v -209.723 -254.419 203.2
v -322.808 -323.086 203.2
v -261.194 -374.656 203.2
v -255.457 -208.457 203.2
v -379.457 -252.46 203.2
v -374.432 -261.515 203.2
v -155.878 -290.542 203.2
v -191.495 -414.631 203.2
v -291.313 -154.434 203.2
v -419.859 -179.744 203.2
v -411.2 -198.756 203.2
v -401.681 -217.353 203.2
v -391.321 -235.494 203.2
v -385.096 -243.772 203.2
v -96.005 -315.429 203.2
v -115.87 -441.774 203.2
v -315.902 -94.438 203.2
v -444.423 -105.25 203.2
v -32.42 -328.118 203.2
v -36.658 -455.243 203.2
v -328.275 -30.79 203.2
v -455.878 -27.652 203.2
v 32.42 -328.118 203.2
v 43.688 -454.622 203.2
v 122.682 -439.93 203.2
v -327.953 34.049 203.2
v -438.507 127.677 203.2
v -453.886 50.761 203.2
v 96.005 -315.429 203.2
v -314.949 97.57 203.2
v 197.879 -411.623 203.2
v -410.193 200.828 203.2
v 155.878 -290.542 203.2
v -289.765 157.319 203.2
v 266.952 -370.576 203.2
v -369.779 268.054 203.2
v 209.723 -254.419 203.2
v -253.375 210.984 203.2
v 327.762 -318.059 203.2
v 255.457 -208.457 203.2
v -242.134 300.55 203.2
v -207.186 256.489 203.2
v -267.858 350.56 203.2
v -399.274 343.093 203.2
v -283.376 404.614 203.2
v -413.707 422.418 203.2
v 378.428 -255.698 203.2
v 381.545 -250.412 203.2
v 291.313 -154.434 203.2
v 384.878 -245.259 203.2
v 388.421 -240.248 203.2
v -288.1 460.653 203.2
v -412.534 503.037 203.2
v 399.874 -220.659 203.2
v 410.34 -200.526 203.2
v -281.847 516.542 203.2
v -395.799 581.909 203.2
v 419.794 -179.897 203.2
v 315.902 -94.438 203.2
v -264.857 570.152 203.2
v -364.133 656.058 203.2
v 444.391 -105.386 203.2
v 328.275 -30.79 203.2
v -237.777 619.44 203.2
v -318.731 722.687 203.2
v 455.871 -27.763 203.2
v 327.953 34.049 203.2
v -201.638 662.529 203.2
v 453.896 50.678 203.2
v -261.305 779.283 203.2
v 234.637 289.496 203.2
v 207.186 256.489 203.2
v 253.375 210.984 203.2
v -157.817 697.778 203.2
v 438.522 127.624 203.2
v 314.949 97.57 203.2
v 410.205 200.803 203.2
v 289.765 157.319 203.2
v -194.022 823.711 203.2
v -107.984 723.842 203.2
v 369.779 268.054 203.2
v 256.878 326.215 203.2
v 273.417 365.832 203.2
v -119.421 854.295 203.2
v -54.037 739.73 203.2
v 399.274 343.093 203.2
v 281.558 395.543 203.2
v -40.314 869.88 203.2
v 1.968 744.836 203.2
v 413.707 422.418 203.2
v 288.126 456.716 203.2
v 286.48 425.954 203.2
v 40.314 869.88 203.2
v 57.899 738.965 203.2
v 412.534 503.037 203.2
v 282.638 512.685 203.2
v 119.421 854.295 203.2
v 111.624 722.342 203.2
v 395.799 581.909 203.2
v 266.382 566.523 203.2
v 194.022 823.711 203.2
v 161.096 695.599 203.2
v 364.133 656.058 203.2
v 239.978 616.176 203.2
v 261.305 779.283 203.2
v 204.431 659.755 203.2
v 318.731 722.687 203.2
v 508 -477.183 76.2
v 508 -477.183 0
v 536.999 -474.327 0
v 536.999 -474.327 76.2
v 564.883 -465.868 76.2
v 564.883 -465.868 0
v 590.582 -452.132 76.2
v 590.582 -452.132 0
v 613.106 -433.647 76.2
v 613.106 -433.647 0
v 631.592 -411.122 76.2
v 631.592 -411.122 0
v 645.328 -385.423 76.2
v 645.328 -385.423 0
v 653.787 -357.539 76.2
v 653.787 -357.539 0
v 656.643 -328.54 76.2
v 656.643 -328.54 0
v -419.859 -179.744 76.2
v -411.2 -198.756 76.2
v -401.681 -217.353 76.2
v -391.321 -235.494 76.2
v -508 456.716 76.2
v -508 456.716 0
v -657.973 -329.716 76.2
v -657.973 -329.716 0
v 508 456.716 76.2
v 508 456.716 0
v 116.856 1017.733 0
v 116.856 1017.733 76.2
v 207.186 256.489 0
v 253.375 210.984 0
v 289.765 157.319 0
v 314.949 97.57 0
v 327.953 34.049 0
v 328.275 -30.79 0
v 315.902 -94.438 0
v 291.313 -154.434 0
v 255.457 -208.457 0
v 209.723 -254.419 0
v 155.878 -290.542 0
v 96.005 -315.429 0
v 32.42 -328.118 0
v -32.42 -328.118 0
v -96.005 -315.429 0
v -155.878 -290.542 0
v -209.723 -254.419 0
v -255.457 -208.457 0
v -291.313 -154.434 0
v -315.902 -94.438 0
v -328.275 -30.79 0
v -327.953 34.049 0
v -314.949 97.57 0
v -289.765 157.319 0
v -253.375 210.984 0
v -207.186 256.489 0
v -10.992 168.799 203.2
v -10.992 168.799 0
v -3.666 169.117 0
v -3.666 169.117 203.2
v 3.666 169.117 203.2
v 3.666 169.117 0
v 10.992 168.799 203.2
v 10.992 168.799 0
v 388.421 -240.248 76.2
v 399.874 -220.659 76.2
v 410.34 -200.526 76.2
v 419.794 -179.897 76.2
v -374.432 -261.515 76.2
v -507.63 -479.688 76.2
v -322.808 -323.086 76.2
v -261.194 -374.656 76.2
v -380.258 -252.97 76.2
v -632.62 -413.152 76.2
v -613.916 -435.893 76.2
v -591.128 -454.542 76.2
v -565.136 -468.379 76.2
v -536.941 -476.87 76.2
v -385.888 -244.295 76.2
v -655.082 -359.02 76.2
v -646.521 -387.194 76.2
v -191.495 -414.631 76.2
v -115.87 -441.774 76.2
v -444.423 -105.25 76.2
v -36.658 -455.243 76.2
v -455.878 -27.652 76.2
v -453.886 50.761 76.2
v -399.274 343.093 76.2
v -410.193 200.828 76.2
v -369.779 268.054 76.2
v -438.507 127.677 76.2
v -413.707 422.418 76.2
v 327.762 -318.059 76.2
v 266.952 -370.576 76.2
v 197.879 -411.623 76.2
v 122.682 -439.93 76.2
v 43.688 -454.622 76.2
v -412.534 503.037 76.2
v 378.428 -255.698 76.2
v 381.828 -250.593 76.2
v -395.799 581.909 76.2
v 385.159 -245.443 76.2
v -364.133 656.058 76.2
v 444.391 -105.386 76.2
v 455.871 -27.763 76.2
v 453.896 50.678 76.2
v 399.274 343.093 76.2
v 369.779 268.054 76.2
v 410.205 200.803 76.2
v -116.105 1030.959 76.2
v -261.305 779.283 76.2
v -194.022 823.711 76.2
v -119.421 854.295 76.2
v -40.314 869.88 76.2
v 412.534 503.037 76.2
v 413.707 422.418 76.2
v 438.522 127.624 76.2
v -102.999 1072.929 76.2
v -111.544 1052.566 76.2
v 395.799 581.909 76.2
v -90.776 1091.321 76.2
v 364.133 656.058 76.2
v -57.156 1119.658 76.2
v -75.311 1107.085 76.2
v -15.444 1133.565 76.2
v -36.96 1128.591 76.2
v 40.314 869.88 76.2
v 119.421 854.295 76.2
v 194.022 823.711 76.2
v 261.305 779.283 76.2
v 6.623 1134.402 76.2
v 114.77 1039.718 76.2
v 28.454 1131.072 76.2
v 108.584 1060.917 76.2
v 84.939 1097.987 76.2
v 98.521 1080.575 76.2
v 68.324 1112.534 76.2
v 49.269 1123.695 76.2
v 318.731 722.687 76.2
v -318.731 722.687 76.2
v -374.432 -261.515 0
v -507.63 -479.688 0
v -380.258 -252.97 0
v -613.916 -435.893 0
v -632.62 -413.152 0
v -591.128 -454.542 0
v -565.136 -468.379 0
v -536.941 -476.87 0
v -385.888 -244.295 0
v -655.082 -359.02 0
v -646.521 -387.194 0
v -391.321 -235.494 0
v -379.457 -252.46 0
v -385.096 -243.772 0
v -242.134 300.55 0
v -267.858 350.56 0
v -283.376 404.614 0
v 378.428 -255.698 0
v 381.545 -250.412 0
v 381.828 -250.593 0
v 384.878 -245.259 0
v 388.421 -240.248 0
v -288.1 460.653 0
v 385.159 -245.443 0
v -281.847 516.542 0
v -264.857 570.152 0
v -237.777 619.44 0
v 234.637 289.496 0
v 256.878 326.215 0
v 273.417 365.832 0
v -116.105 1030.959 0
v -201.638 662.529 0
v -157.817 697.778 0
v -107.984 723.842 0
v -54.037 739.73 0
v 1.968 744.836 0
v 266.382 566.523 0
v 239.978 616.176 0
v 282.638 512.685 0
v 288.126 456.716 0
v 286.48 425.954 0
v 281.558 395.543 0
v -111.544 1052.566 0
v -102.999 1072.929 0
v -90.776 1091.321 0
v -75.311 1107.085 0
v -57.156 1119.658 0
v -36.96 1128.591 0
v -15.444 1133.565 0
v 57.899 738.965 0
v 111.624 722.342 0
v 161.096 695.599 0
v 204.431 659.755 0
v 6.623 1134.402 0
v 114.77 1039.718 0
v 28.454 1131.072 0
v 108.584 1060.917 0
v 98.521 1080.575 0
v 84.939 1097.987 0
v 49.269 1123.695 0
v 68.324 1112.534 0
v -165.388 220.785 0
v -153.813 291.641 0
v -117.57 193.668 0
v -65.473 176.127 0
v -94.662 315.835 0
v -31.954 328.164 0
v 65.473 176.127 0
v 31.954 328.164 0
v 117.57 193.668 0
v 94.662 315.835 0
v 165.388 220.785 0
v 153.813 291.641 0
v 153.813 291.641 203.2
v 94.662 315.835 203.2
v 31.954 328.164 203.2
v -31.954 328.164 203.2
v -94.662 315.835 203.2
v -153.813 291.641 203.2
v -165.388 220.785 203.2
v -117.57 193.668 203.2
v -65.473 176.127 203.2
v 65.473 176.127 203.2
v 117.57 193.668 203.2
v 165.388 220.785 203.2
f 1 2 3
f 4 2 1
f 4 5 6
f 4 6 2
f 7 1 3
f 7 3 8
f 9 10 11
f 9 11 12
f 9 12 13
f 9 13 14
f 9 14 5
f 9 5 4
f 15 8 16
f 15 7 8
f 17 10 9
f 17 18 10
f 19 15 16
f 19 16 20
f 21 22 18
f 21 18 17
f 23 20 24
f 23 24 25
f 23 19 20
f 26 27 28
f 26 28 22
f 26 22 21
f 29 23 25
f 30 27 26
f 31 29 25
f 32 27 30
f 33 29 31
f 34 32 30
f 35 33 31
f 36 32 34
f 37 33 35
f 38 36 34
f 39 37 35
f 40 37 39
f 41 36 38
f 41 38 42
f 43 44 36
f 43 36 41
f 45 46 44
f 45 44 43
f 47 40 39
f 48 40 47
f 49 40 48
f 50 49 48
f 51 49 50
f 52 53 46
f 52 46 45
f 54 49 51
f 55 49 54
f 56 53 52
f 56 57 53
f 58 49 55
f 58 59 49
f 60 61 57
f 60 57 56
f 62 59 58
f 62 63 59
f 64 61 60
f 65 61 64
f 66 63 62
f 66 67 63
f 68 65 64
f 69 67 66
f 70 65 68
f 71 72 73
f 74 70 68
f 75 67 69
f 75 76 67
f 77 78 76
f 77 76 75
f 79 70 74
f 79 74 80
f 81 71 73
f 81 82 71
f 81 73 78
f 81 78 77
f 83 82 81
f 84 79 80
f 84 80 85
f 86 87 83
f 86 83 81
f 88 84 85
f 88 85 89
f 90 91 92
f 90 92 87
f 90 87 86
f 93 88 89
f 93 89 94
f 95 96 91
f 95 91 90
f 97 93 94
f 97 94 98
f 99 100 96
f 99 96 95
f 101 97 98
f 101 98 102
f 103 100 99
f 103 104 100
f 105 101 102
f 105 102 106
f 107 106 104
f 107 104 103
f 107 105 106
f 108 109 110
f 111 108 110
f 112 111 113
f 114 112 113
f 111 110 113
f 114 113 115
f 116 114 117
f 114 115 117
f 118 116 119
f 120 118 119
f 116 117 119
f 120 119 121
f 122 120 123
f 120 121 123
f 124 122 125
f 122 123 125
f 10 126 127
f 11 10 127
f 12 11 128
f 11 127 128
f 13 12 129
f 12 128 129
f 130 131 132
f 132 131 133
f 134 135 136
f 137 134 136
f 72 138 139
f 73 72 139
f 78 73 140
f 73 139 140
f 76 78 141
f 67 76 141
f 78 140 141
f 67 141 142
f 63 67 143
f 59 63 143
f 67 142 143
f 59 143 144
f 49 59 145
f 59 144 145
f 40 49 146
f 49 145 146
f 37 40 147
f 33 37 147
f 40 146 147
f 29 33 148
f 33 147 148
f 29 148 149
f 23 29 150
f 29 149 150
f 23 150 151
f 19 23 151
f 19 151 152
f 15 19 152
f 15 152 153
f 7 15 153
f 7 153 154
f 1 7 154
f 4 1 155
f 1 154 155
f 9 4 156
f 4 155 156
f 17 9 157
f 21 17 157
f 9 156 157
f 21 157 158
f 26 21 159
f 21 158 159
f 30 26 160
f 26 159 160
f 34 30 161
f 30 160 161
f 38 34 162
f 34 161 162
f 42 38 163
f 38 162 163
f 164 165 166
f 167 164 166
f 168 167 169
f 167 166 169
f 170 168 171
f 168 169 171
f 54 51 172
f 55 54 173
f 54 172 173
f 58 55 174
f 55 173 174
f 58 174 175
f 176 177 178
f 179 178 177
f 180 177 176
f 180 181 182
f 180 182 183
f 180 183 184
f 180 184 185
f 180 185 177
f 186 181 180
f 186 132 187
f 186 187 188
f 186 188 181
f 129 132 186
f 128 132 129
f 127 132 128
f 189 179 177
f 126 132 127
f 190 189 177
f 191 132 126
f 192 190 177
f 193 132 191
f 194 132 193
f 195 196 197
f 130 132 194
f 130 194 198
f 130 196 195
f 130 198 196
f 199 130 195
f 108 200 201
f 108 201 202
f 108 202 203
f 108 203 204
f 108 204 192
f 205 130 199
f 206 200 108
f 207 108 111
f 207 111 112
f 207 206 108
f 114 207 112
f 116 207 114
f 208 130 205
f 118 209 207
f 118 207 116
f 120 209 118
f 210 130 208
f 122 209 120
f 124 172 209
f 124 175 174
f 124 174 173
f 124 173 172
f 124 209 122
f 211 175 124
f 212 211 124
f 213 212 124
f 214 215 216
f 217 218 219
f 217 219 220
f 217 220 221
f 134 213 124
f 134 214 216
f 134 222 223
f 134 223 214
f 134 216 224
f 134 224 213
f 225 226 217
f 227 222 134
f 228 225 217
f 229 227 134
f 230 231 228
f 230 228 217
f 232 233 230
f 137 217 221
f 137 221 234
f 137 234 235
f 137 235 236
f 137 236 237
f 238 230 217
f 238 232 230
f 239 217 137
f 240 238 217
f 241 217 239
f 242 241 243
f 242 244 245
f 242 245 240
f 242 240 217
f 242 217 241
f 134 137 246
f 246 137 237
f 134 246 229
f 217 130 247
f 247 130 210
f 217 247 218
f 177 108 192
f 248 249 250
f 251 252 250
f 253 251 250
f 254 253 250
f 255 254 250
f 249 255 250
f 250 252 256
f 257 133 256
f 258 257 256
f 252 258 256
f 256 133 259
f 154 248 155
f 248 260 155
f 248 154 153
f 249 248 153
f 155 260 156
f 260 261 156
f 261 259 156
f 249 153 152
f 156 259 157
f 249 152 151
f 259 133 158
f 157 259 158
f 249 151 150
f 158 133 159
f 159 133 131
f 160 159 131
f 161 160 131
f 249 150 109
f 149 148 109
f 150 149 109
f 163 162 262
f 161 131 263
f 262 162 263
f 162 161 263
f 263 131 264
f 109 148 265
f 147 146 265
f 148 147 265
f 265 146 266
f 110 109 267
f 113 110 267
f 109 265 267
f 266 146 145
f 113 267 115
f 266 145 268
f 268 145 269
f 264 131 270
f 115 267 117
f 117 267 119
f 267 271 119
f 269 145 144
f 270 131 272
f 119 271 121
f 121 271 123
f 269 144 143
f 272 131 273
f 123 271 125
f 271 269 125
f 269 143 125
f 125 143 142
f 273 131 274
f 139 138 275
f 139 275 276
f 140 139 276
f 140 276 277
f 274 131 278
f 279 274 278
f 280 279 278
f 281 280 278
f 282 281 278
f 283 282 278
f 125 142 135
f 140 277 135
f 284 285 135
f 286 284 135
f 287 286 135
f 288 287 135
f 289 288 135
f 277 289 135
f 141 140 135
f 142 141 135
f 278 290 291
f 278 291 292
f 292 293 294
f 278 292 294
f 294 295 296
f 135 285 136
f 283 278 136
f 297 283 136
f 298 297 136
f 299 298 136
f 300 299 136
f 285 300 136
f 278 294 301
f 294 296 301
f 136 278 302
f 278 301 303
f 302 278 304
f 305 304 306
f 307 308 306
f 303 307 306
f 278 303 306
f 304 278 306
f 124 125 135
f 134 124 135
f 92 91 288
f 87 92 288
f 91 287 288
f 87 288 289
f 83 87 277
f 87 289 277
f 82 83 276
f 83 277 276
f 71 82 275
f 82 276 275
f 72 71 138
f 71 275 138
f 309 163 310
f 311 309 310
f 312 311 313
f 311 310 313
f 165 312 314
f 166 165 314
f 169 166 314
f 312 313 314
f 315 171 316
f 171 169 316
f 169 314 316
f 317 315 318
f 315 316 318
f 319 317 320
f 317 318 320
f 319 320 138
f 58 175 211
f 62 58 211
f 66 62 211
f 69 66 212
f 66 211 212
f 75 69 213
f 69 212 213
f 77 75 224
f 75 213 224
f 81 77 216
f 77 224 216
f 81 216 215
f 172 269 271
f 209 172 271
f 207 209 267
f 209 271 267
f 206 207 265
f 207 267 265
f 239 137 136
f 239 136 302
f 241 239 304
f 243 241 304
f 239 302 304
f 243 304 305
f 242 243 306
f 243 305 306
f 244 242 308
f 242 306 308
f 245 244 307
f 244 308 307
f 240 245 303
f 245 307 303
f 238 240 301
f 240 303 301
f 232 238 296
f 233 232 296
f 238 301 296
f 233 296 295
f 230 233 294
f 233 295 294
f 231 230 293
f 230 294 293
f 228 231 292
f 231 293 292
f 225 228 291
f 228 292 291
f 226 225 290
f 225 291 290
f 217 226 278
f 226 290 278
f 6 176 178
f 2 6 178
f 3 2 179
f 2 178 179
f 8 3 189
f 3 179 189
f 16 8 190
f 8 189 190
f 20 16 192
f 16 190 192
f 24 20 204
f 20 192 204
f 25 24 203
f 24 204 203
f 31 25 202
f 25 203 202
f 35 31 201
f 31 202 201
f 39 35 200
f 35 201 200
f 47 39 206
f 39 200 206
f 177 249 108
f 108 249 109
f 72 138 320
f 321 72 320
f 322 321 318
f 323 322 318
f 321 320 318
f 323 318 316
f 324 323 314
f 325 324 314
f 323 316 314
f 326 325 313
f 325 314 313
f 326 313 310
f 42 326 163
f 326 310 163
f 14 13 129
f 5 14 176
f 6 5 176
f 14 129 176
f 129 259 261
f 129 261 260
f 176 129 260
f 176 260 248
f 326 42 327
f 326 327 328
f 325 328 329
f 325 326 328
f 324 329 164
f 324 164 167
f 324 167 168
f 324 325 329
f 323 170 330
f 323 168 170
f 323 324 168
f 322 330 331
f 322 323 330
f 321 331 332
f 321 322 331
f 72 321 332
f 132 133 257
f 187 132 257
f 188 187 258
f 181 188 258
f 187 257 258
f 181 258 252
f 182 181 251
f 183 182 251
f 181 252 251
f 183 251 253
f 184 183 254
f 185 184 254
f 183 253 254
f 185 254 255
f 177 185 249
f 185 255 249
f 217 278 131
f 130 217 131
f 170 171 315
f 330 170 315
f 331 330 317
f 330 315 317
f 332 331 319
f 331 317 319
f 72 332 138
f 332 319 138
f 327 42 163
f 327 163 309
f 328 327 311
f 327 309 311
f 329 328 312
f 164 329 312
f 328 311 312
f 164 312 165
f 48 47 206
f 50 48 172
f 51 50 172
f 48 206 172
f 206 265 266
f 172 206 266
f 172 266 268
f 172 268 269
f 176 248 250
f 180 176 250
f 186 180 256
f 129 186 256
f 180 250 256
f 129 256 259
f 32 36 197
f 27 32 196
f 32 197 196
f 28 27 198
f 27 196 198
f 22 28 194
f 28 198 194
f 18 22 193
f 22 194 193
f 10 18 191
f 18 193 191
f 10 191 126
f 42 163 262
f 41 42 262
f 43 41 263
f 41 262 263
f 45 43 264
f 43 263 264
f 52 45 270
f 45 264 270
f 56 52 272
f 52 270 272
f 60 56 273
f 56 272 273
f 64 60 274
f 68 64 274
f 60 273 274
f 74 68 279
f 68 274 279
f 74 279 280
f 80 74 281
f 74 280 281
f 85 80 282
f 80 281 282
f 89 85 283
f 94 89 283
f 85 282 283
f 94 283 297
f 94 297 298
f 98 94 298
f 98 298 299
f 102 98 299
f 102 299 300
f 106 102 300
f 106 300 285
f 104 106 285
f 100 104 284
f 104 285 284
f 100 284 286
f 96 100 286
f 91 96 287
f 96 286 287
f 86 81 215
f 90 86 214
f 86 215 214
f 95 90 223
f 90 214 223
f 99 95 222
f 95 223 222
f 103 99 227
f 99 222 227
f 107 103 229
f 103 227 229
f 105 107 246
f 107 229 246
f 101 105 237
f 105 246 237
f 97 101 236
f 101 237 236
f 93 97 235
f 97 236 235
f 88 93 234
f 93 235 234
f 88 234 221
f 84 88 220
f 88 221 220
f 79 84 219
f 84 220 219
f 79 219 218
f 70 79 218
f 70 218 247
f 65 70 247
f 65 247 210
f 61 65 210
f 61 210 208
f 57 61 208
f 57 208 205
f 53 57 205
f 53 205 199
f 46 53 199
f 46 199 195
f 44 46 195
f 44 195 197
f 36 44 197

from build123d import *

# Parameters (mm, degrees)
F1_DEPTH = 203.2
F2_DEPTH = 76.2
F3_DEPTH = 76.2


with BuildPart() as f1:
    # F0 (on Top) → F1 (new body)
    with BuildSketch(Plane.XY):
        with BuildLine():
            ThreePointArc((419.7935890943, -179.8970573523), (447.3902688574, -91.8235047271), (456.7161138921, 0))
            ThreePointArc((456.7161138921, 0), (434.4385486274, 140.8998089254), (369.7791499823, 268.054078363))
            ThreePointArc((369.7791499823, 268.054078363), (325.2928462726, 320.5841119777), (273.4170123321, 365.8315815455))
            ThreePointArc((273.4170123321, 365.8315815455), (246.4421811438, 307.4408238889), (207.1859726201, 256.489158659))
            ThreePointArc((207.1859726201, 256.489158659), (297.5107304832, 142.1269890184), (329.7161138921, 0))
            ThreePointArc((329.7161138921, 0), (-142.1269890184, -297.5107304832), (-207.1859726201, 256.489158659))
            ThreePointArc((-207.1859726201, 256.489158659), (-246.4421811438, 307.4408238889), (-273.4170123321, 365.8315815455))
            ThreePointArc((-273.4170123321, 365.8315815455), (-325.2928462726, 320.5841119777), (-369.7791499823, 268.054078363))
            ThreePointArc((-369.7791499823, 268.054078363), (-453.8864585085, 50.7611216519), (-419.8593220682, -179.7435905981))
            ThreePointArc((-419.8593220682, -179.7435905981), (-406.5468550807, -208.1087775964), (-391.3208220922, -235.4944221967))
            ThreePointArc((-391.3208220922, -235.4944221967), (-382.2017695395, -248.0670908962), (-374.4319310628, -261.5154635758))
            ThreePointArc((-374.4319310628, -261.5154635758), (3.5288735732, -456.7024805494), (378.4283659046, -255.6982216744))
            ThreePointArc((378.4283659046, -255.6982216744), (383.1851939749, -247.8182784421), (388.4206166967, -240.2478578752))
            ThreePointArc((388.4206166967, -240.2478578752), (405.232162336, -210.6573124702), (419.7935890943, -179.8970573523))
        make_face()
        with BuildLine():
            ThreePointArc((273.4170123321, 365.8315815455), (325.2928462726, 320.5841119777), (369.7791499823, 268.054078363))
            ThreePointArc((369.7791499823, 268.054078363), (385.986239752, 609.5055315027), (140.4677009498, 847.3550883961))
            ThreePointArc((140.4677009498, 847.3550883961), (1.9062997603, 871.8382036836), (-136.8741128131, 848.6286815054))
            ThreePointArc((-136.8741128131, 848.6286815054), (-385.2805466524, 611.2764056323), (-369.7791499823, 268.054078363))
            ThreePointArc((-369.7791499823, 268.054078363), (-325.2928462726, 320.5841119777), (-273.4170123321, 365.8315815455))
            ThreePointArc((-273.4170123321, 365.8315815455), (-46.0335917284, 741.1414455435), (288.1264667684, 456.7161138921))
            ThreePointArc((288.1264667684, 456.7161138921), (284.4253316514, 410.6825221637), (273.4170123321, 365.8315815455))
        make_face()
    extrude(amount=F1_DEPTH)

    # F0 (on Top) → F2 (join)
    with BuildSketch(Plane.XY):
        with BuildLine():
            ThreePointArc((-136.8741128131, 848.6286815054), (1.9062997603, 871.8382036836), (140.4677009498, 847.3550883961))
            Line((140.4677009498, 847.3550883961), (116.8562267222, 1017.7334547043))
            ThreePointArc((116.8562267222, 1017.7334547043), (-6.6232636312, 901.0650780865), (-116.1054302545, 1030.9586877525))
            Line((-116.1054302545, 1030.9586877525), (-136.8741128131, 848.6286815054))
        make_face()
        with BuildLine():
            ThreePointArc((-369.7791499823, 268.054078363), (-385.2805466524, 611.2764056323), (-136.8741128131, 848.6286815054))
            Line((-136.8741128131, 848.6286815054), (-116.1054302545, 1030.9586877525))
            Line((-116.1054302545, 1030.9586877525), (-508, 456.7161138921))
            Line((-508, 456.7161138921), (-647.4473526625, -274.5237812852))
            ThreePointArc((-647.4473526625, -274.5237812852), (-592.3042832709, -205.6816607537), (-508, -179.7435905981))
            Line((-508, -179.7435905981), (-419.8593220682, -179.7435905981))
            ThreePointArc((-419.8593220682, -179.7435905981), (-453.8864585085, 50.7611216519), (-369.7791499823, 268.054078363))
        make_face()
        with BuildLine():
            ThreePointArc((369.7791499823, 268.054078363), (434.4385486274, 140.8998089254), (456.7161138921, 0))
            ThreePointArc((456.7161138921, 0), (447.3902688574, -91.8235047271), (419.7935890943, -179.8970573523))
            Line((419.7935890943, -179.8970573523), (508, -179.8970573523))
            ThreePointArc((508, -179.8970573523), (591.7238414708, -205.718805945), (646.3592496941, -274.212721728))
            Line((646.3592496941, -274.212721728), (508, 456.7161138919))
            Line((508, 456.7161138919), (116.8562267222, 1017.7334547043))
            Line((116.8562267222, 1017.7334547043), (140.4677009498, 847.3550883961))
            ThreePointArc((140.4677009498, 847.3550883961), (385.986239752, 609.5055315027), (369.7791499823, 268.054078363))
        make_face()
        with BuildLine():
            Line((508, -179.8970573523), (419.7935890943, -179.8970573523))
            ThreePointArc((419.7935890943, -179.8970573523), (405.232162336, -210.6573124702), (388.4206166967, -240.2478578752))
            ThreePointArc((388.4206166967, -240.2478578752), (441.0271546914, -195.8397204001), (508, -179.8970573523))
        make_face()
        with BuildLine():
            ThreePointArc((508, -477.1830565354), (379.6992396403, -403.597742884), (378.4283659046, -255.6982216744))
            ThreePointArc((378.4283659046, -255.6982216744), (3.5288735732, -456.7024805494), (-374.4319310628, -261.5154635758))
            ThreePointArc((-374.4319310628, -261.5154635758), (-362.1862522373, -294.6432083013), (-358.027476706, -329.7161138921))
            ThreePointArc((-358.027476706, -329.7161138921), (-401.8227065948, -435.6318356161), (-507.6300820622, -479.6881809709))
            Line((-507.6300820622, -479.6881809709), (508, -477.1830565354))
        make_face()
        with BuildLine():
            ThreePointArc((-391.3208220922, -235.4944221967), (-406.5468550807, -208.1087775964), (-419.8593220682, -179.7435905981))
            Line((-419.8593220682, -179.7435905981), (-508, -179.7435905981))
            ThreePointArc((-508, -179.7435905981), (-443.3428546463, -194.3971895028), (-391.3208220922, -235.4944221967))
        make_face()
    extrude(amount=F2_DEPTH)

    # F0 (on Top) → F3 (join)
    with BuildSketch(Plane.XY):
        with BuildLine():
            ThreePointArc((508, -179.8970573523), (441.0271546914, -195.8397204001), (388.4206166967, -240.2478578752))
            ThreePointArc((388.4206166967, -240.2478578752), (383.5023063354, -248.0233652786), (378.4283659046, -255.6982216744))
            ThreePointArc((378.4283659046, -255.6982216744), (379.6992396403, -403.597742884), (508, -477.1830565354))
            ThreePointArc((508, -477.1830565354), (613.1064729871, -433.646529931), (656.6429995915, -328.5400569439))
            Line((656.6429995915, -328.5400569439), (646.3592496941, -274.212721728))
            ThreePointArc((646.3592496941, -274.212721728), (591.7238414708, -205.718805945), (508, -179.8970573523))
        make_face()
        with BuildLine():
            ThreePointArc((-358.027476706, -329.7161138921), (-362.1862522373, -294.6432083013), (-374.4319310628, -261.5154635758))
            ThreePointArc((-374.4319310628, -261.5154635758), (-383.0973680277, -248.6483768275), (-391.3208220922, -235.4944221967))
            ThreePointArc((-391.3208220922, -235.4944221967), (-443.3428546463, -194.3971895028), (-508, -179.7435905981))
            ThreePointArc((-508, -179.7435905981), (-592.3042832709, -205.6816607537), (-647.4473526625, -274.5237812852))
            Line((-647.4473526625, -274.5237812852), (-657.972523294, -329.7161138921))
            ThreePointArc((-657.972523294, -329.7161138921), (-613.915721724, -435.8934072973), (-507.6300820622, -479.6881809709))
            ThreePointArc((-507.6300820622, -479.6881809709), (-401.8227065948, -435.6318356161), (-358.027476706, -329.7161138921))
        make_face()
        with BuildLine():
            ThreePointArc((-116.1054302545, 1030.9586877525), (-6.6232636312, 901.0650780865), (116.8562267222, 1017.7334547043))
            ThreePointArc((116.8562267222, 1017.7334547043), (6.6232636312, 1134.401831322), (-116.1054302545, 1030.9586877525))
        make_face()
    extrude(amount=F3_DEPTH)


with BuildPart() as f1b:
    # F0 (on Top) → F1, piece 2 (new body)
    with BuildSketch(Plane.XY):
        with BuildLine():
            ThreePointArc((10.9918600793, 168.7993900561), (117.5702579301, 193.6684085178), (207.1859726201, 256.489158659))
            ThreePointArc((207.1859726201, 256.489158659), (0, 329.7161138921), (-207.1859726201, 256.489158659))
            ThreePointArc((-207.1859726201, 256.489158659), (-117.5702579301, 193.6684085178), (-10.9918600793, 168.7993900561))
            ThreePointArc((-10.9918600793, 168.7993900561), (0, 169.1568948383), (10.9918600793, 168.7993900561))
        make_face()
    extrude(amount=F1_DEPTH)


solid = Compound([f1.part, f1b.part])
